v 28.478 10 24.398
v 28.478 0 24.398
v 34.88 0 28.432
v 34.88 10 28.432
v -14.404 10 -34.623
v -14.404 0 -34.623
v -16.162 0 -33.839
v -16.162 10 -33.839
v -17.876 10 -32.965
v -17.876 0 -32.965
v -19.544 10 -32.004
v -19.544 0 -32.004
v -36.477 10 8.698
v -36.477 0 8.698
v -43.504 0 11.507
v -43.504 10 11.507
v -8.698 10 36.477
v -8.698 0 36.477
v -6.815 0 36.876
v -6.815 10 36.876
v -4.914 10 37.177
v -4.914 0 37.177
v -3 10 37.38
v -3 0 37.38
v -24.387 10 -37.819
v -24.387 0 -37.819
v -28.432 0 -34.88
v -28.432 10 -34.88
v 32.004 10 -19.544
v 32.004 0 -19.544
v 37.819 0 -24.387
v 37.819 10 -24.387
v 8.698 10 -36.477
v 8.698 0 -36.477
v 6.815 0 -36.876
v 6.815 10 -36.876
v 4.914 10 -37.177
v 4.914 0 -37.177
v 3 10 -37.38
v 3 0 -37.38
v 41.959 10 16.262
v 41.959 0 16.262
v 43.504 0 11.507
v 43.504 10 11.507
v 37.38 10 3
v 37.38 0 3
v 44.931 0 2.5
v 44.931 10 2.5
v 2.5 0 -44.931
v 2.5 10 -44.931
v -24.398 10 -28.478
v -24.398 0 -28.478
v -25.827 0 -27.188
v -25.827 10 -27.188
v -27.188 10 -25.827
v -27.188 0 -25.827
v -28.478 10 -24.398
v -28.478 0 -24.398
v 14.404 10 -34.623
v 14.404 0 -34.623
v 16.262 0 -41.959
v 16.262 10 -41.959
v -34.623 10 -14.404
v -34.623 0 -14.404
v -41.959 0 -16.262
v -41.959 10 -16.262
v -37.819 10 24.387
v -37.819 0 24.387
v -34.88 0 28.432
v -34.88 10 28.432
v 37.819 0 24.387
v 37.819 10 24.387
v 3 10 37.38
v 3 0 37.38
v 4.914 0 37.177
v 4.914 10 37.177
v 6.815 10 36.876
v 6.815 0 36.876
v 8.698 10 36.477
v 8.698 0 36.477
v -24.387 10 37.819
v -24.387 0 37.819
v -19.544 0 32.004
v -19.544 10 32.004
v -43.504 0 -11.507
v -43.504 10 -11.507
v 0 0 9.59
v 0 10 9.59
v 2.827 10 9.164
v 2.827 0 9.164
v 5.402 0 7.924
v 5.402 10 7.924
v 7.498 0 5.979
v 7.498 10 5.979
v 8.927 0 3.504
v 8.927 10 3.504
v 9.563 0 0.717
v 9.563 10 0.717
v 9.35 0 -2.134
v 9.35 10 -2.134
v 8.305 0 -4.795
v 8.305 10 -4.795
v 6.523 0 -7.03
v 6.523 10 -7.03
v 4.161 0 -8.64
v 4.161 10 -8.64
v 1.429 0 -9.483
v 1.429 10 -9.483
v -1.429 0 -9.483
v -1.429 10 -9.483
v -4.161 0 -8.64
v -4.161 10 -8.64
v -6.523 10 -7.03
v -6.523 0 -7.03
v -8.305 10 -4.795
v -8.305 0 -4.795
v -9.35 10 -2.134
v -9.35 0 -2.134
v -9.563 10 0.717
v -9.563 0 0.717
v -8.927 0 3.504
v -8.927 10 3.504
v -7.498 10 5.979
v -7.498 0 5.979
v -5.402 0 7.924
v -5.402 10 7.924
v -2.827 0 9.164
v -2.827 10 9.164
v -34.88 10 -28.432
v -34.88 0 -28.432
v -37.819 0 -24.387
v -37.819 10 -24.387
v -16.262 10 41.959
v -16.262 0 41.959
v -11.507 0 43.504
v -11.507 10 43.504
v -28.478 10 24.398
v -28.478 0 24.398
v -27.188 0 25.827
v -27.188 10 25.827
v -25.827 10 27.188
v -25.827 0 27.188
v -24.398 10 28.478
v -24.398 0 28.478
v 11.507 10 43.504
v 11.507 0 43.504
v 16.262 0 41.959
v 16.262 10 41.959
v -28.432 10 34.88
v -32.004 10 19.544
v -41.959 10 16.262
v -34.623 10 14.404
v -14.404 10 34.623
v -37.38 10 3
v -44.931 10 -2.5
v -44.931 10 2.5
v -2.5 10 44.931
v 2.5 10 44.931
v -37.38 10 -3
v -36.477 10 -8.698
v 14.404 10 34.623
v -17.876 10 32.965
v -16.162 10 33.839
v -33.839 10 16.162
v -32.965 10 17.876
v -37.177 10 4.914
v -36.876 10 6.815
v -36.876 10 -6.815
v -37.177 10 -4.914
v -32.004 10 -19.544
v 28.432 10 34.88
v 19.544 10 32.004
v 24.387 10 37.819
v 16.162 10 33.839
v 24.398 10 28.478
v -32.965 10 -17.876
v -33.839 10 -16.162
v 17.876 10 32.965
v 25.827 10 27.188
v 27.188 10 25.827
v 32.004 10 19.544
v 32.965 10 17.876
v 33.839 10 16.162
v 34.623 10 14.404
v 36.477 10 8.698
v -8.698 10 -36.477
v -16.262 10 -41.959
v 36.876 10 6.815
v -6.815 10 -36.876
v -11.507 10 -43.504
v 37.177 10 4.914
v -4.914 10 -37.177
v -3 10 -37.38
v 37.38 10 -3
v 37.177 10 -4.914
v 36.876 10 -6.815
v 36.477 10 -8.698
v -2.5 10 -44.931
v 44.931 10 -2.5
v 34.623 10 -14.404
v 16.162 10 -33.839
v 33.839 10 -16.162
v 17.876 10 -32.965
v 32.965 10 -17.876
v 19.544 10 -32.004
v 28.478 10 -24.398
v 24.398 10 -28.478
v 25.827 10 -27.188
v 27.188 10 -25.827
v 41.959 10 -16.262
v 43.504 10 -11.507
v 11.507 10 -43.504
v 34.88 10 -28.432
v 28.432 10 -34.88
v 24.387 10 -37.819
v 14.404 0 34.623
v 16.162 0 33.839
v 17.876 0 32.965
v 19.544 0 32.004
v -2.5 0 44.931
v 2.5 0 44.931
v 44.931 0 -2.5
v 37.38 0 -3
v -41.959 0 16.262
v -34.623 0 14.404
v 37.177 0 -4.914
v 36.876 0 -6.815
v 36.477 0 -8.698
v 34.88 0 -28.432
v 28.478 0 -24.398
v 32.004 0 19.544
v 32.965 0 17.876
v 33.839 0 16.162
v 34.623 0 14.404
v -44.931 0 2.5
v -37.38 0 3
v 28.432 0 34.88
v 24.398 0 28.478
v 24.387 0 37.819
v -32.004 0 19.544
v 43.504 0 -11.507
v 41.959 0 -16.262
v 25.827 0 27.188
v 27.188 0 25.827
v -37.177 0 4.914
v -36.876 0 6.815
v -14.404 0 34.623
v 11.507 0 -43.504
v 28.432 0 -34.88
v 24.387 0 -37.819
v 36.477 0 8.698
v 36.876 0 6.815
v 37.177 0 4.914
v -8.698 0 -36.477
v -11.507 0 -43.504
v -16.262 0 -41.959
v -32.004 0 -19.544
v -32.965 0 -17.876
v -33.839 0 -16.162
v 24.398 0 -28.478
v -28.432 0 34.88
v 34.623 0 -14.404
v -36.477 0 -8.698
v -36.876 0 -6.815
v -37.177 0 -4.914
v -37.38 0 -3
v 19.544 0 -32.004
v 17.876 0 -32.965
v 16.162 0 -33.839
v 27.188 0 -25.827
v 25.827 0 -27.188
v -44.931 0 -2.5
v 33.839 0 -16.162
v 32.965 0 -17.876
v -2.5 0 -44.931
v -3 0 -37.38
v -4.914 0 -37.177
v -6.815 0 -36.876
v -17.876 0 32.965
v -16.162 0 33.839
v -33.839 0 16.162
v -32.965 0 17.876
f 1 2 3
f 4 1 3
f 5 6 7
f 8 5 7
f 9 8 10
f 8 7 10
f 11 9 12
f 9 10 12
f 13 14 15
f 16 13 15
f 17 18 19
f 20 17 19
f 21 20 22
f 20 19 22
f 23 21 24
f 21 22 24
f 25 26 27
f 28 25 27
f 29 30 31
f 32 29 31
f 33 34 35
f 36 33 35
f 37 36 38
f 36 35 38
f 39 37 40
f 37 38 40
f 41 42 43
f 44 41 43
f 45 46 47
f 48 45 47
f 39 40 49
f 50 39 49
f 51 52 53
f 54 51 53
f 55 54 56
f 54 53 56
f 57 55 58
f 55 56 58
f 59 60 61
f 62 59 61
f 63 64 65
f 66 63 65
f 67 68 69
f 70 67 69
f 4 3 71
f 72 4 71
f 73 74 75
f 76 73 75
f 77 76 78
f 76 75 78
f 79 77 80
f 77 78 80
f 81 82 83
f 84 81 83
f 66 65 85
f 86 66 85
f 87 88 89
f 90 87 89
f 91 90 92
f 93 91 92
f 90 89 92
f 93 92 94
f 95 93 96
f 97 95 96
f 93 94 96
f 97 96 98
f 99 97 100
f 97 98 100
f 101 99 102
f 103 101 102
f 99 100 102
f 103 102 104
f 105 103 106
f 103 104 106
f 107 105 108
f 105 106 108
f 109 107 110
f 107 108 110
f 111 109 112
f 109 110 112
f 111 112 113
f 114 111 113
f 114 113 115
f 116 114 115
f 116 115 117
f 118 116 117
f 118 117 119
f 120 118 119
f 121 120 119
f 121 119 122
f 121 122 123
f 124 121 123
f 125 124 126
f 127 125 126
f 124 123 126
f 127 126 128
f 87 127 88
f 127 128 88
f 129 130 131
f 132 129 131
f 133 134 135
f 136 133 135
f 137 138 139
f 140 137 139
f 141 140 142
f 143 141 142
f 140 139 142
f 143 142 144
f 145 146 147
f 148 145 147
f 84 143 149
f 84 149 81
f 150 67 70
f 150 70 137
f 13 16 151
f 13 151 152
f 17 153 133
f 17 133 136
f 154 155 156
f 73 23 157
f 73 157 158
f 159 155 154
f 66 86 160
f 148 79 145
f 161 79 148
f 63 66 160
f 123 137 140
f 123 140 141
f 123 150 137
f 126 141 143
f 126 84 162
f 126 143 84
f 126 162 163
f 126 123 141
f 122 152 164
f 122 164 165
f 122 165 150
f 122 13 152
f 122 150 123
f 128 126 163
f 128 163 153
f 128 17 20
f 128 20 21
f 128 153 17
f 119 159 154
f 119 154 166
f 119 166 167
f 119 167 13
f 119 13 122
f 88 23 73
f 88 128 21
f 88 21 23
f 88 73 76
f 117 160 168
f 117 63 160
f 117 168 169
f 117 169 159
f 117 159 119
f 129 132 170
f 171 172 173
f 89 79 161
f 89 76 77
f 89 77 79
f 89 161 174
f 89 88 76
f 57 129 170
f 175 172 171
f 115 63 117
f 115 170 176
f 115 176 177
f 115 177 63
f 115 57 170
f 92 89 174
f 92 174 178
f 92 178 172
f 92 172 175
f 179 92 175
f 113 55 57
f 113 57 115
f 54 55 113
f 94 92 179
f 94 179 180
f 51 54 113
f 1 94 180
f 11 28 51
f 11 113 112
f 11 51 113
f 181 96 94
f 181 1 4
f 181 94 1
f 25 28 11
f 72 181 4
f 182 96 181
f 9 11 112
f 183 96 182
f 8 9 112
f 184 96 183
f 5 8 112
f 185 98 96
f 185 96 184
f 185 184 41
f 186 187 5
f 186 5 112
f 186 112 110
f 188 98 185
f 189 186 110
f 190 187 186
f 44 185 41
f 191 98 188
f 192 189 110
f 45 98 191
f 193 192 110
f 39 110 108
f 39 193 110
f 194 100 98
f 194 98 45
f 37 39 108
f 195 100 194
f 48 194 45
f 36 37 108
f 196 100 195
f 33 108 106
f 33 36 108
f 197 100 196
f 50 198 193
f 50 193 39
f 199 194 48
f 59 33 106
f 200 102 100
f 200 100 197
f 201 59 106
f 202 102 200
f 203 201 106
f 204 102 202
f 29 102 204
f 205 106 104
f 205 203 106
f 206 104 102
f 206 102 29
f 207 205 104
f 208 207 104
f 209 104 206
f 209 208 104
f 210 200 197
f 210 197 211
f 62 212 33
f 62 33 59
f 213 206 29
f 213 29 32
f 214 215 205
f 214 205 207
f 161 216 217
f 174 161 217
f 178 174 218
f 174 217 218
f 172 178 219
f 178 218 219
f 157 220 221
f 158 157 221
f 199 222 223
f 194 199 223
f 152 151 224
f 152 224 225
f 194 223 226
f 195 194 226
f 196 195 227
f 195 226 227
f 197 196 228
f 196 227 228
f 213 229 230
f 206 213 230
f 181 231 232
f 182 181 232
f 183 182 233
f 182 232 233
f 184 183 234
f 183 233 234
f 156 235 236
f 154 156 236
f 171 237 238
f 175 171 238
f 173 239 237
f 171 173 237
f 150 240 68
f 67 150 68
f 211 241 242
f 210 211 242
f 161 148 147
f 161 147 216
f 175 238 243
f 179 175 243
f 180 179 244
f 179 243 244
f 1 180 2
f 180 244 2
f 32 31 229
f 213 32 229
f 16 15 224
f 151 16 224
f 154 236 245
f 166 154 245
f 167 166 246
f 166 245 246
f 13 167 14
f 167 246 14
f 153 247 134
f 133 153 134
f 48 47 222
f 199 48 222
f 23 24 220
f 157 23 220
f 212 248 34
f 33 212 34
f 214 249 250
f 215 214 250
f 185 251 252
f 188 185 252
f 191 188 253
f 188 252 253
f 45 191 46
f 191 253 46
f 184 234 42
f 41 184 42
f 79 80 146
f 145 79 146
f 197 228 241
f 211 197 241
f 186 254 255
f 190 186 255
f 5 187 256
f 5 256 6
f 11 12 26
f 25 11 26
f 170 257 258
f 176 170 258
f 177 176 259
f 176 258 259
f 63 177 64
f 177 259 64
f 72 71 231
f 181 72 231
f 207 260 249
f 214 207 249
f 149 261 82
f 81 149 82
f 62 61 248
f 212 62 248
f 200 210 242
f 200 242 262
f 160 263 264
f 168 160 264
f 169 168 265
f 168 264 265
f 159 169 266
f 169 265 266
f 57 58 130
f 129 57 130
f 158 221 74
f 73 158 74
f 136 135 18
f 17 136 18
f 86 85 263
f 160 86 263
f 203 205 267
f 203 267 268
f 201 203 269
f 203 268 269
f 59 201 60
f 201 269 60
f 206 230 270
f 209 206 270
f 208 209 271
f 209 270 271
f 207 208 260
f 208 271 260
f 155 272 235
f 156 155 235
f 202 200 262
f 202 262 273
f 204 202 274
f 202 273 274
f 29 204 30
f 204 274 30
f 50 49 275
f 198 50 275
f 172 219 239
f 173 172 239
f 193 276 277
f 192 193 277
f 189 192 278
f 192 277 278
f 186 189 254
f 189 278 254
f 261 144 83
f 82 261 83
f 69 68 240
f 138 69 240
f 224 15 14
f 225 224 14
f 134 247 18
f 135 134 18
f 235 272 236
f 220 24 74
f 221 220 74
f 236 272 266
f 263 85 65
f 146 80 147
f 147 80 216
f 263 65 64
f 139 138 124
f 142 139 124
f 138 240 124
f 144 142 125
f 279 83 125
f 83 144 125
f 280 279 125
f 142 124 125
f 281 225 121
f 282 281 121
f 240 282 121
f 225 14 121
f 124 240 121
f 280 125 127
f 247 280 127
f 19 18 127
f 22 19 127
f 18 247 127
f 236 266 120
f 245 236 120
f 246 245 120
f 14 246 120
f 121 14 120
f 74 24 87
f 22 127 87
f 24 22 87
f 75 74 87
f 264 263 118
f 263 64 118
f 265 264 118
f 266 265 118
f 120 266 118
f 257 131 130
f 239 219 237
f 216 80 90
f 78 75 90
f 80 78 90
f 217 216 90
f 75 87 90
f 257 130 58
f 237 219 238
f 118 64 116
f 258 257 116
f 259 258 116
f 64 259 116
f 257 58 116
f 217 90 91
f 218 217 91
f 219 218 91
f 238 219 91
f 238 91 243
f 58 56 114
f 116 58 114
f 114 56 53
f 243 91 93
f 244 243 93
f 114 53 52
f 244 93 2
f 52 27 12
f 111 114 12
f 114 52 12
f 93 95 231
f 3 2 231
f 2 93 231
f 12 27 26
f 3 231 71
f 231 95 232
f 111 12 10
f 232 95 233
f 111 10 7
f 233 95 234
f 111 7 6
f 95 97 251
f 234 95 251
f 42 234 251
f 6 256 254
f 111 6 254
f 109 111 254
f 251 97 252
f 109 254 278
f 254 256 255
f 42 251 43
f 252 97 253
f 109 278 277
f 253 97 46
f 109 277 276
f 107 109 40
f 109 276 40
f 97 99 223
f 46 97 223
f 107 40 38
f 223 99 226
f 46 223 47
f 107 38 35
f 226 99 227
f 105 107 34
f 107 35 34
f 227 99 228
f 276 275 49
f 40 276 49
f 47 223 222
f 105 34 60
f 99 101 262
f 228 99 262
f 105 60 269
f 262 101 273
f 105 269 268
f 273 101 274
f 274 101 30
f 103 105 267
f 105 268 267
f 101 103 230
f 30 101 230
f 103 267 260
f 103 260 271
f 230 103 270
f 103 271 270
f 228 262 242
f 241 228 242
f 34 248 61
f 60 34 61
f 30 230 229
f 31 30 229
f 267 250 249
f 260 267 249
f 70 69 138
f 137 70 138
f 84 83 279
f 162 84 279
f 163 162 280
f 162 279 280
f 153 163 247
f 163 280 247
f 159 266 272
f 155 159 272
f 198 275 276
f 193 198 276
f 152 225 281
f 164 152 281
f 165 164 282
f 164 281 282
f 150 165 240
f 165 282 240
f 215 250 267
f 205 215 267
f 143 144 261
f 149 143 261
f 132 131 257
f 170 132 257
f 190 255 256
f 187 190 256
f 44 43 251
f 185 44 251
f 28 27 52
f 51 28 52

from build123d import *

# Parameters (mm, degrees)
SKETCH1_R           = 37.5
BOSS_EXTRUDE1_DEPTH = 10
SKETCH2_R           = 9.59
CUT_EXTRUDE1_DEPTH  = 10


with BuildPart() as part:
    # Sketch1 → Boss-Extrude1 (new body)
    with BuildSketch(Plane(origin=(0, 0, 0), x_dir=(1, 0, 0), z_dir=(0, 1, 0))):
        Circle(SKETCH1_R)
        with BuildLine():
            ThreePointArc((-14.404165277, 34.623258406), (-11.588137289, 35.664619361), (-8.697826179, 36.477360373))
            Line((-8.697826179, 36.477360373), (-11.506647359, 43.503989088))
            Line((-11.506647359, 43.503989088), (-16.26192994, 41.958904116))
            Line((-16.26192994, 41.958904116), (-14.404165277, 34.623258406))
        make_face()
        with BuildLine():
            ThreePointArc((-24.398350496, 28.477543663), (-22.041946961, 30.338137289), (-19.54424853, 32.004255176))
            Line((-19.54424853, 32.004255176), (-24.386943903, 37.819002725))
            Line((-24.386943903, 37.819002725), (-28.432028874, 34.880076463))
            Line((-28.432028874, 34.880076463), (-24.398350496, 28.477543663))
        make_face()
        with BuildLine():
            ThreePointArc((-32.004255176, 19.54424853), (-30.338137289, 22.041946961), (-28.477543663, 24.398350496))
            Line((-28.477543663, 24.398350496), (-34.880076463, 28.432028874))
            Line((-34.880076463, 28.432028874), (-37.819002725, 24.386943903))
            Line((-37.819002725, 24.386943903), (-32.004255176, 19.54424853))
        make_face()
        with BuildLine():
            ThreePointArc((-36.477360373, 8.697826179), (-35.664619361, 11.588137289), (-34.623258406, 14.404165277))
            Line((-34.623258406, 14.404165277), (-41.958904116, 16.26192994))
            Line((-41.958904116, 16.26192994), (-43.503989088, 11.506647359))
            Line((-43.503989088, 11.506647359), (-36.477360373, 8.697826179))
        make_face()
        with BuildLine():
            ThreePointArc((-37.379807383, -3), (-37.5, 0), (-37.379807383, 3))
            Line((-37.379807383, 3), (-44.930501889, 2.5))
            Line((-44.930501889, 2.5), (-44.930501889, -2.5))
            Line((-44.930501889, -2.5), (-37.379807383, -3))
        make_face()
        with BuildLine():
            ThreePointArc((-34.623258406, -14.404165277), (-35.664619361, -11.588137289), (-36.477360373, -8.697826179))
            Line((-36.477360373, -8.697826179), (-43.503989088, -11.506647359))
            Line((-43.503989088, -11.506647359), (-41.958904116, -16.26192994))
            Line((-41.958904116, -16.26192994), (-34.623258406, -14.404165277))
        make_face()
        with BuildLine():
            ThreePointArc((-28.477543663, -24.398350496), (-30.338137289, -22.041946961), (-32.004255176, -19.54424853))
            Line((-32.004255176, -19.54424853), (-37.819002725, -24.386943903))
            Line((-37.819002725, -24.386943903), (-34.880076463, -28.432028874))
            Line((-34.880076463, -28.432028874), (-28.477543663, -24.398350496))
        make_face()
        with BuildLine():
            ThreePointArc((-19.54424853, -32.004255176), (-22.041946961, -30.338137289), (-24.398350496, -28.477543663))
            Line((-24.398350496, -28.477543663), (-28.432028874, -34.880076463))
            Line((-28.432028874, -34.880076463), (-24.386943903, -37.819002725))
            Line((-24.386943903, -37.819002725), (-19.54424853, -32.004255176))
        make_face()
        with BuildLine():
            ThreePointArc((-8.697826179, -36.477360373), (-11.588137289, -35.664619361), (-14.404165277, -34.623258406))
            Line((-14.404165277, -34.623258406), (-16.26192994, -41.958904116))
            Line((-16.26192994, -41.958904116), (-11.506647359, -43.503989088))
            Line((-11.506647359, -43.503989088), (-8.697826179, -36.477360373))
        make_face()
        with BuildLine():
            ThreePointArc((3, -37.379807383), (0, -37.5), (-3, -37.379807383))
            Line((-3, -37.379807383), (-2.5, -44.930501889))
            Line((-2.5, -44.930501889), (2.5, -44.930501889))
            Line((2.5, -44.930501889), (3, -37.379807383))
        make_face()
        with BuildLine():
            Line((11.506647359, -43.503989088), (16.26192994, -41.958904116))
            Line((16.26192994, -41.958904116), (14.404165277, -34.623258406))
            ThreePointArc((14.404165277, -34.623258406), (11.588137289, -35.664619361), (8.697826179, -36.477360373))
            Line((8.697826179, -36.477360373), (11.506647359, -43.503989088))
        make_face()
        with BuildLine():
            Line((24.386943903, -37.819002725), (28.432028874, -34.880076463))
            Line((28.432028874, -34.880076463), (24.398350496, -28.477543663))
            ThreePointArc((24.398350496, -28.477543663), (22.041946961, -30.338137289), (19.54424853, -32.004255176))
            Line((19.54424853, -32.004255176), (24.386943903, -37.819002725))
        make_face()
        with BuildLine():
            Line((34.880076463, -28.432028874), (37.819002725, -24.386943903))
            Line((37.819002725, -24.386943903), (32.004255176, -19.54424853))
            ThreePointArc((32.004255176, -19.54424853), (30.338137289, -22.041946961), (28.477543663, -24.398350496))
            Line((28.477543663, -24.398350496), (34.880076463, -28.432028874))
        make_face()
        with BuildLine():
            Line((41.958904116, -16.26192994), (43.503989088, -11.506647359))
            Line((43.503989088, -11.506647359), (36.477360373, -8.697826179))
            ThreePointArc((36.477360373, -8.697826179), (35.664619361, -11.588137289), (34.623258406, -14.404165277))
            Line((34.623258406, -14.404165277), (41.958904116, -16.26192994))
        make_face()
        with BuildLine():
            Line((44.930501889, 2.5), (37.379807383, 3))
            ThreePointArc((37.379807383, 3), (37.469939798, 1.501203373), (37.5, 0))
            ThreePointArc((37.5, 0), (37.469939798, -1.501203373), (37.379807383, -3))
            Line((37.379807383, -3), (44.930501889, -2.5))
            Line((44.930501889, -2.5), (44.930501889, 2.5))
        make_face()
        with BuildLine():
            Line((41.958904116, 16.26192994), (34.623258406, 14.404165277))
            ThreePointArc((34.623258406, 14.404165277), (35.664619361, 11.588137289), (36.477360373, 8.697826179))
            Line((36.477360373, 8.697826179), (43.503989088, 11.506647359))
            Line((43.503989088, 11.506647359), (41.958904116, 16.26192994))
        make_face()
        with BuildLine():
            Line((34.880076463, 28.432028874), (28.477543663, 24.398350496))
            ThreePointArc((28.477543663, 24.398350496), (30.338137289, 22.041946961), (32.004255176, 19.54424853))
            Line((32.004255176, 19.54424853), (37.819002725, 24.386943903))
            Line((37.819002725, 24.386943903), (34.880076463, 28.432028874))
        make_face()
        with BuildLine():
            Line((24.386943903, 37.819002725), (19.54424853, 32.004255176))
            ThreePointArc((19.54424853, 32.004255176), (22.041946961, 30.338137289), (24.398350496, 28.477543663))
            Line((24.398350496, 28.477543663), (28.432028874, 34.880076463))
            Line((28.432028874, 34.880076463), (24.386943903, 37.819002725))
        make_face()
        with BuildLine():
            Line((11.506647359, 43.503989088), (8.697826179, 36.477360373))
            ThreePointArc((8.697826179, 36.477360373), (11.588137289, 35.664619361), (14.404165277, 34.623258406))
            Line((14.404165277, 34.623258406), (16.26192994, 41.958904116))
            Line((16.26192994, 41.958904116), (11.506647359, 43.503989088))
        make_face()
        with BuildLine():
            Line((-2.5, 44.930501889), (-3, 37.379807383))
            ThreePointArc((-3, 37.379807383), (0, 37.5), (3, 37.379807383))
            Line((3, 37.379807383), (2.5, 44.930501889))
            Line((2.5, 44.930501889), (-2.5, 44.930501889))
        make_face()
    extrude(amount=BOSS_EXTRUDE1_DEPTH)

    # Sketch2 → Cut-Extrude1 (cut)
    with BuildSketch(Plane(origin=(0, 10, 0), x_dir=(1, 0, 0), z_dir=(0, 1, 0))):
        with Locations(Location((0, 0, 0), (0, 0, 270))):
            Circle(SKETCH2_R)
    extrude(amount=-CUT_EXTRUDE1_DEPTH, mode=Mode.SUBTRACT)


solid = part.part
